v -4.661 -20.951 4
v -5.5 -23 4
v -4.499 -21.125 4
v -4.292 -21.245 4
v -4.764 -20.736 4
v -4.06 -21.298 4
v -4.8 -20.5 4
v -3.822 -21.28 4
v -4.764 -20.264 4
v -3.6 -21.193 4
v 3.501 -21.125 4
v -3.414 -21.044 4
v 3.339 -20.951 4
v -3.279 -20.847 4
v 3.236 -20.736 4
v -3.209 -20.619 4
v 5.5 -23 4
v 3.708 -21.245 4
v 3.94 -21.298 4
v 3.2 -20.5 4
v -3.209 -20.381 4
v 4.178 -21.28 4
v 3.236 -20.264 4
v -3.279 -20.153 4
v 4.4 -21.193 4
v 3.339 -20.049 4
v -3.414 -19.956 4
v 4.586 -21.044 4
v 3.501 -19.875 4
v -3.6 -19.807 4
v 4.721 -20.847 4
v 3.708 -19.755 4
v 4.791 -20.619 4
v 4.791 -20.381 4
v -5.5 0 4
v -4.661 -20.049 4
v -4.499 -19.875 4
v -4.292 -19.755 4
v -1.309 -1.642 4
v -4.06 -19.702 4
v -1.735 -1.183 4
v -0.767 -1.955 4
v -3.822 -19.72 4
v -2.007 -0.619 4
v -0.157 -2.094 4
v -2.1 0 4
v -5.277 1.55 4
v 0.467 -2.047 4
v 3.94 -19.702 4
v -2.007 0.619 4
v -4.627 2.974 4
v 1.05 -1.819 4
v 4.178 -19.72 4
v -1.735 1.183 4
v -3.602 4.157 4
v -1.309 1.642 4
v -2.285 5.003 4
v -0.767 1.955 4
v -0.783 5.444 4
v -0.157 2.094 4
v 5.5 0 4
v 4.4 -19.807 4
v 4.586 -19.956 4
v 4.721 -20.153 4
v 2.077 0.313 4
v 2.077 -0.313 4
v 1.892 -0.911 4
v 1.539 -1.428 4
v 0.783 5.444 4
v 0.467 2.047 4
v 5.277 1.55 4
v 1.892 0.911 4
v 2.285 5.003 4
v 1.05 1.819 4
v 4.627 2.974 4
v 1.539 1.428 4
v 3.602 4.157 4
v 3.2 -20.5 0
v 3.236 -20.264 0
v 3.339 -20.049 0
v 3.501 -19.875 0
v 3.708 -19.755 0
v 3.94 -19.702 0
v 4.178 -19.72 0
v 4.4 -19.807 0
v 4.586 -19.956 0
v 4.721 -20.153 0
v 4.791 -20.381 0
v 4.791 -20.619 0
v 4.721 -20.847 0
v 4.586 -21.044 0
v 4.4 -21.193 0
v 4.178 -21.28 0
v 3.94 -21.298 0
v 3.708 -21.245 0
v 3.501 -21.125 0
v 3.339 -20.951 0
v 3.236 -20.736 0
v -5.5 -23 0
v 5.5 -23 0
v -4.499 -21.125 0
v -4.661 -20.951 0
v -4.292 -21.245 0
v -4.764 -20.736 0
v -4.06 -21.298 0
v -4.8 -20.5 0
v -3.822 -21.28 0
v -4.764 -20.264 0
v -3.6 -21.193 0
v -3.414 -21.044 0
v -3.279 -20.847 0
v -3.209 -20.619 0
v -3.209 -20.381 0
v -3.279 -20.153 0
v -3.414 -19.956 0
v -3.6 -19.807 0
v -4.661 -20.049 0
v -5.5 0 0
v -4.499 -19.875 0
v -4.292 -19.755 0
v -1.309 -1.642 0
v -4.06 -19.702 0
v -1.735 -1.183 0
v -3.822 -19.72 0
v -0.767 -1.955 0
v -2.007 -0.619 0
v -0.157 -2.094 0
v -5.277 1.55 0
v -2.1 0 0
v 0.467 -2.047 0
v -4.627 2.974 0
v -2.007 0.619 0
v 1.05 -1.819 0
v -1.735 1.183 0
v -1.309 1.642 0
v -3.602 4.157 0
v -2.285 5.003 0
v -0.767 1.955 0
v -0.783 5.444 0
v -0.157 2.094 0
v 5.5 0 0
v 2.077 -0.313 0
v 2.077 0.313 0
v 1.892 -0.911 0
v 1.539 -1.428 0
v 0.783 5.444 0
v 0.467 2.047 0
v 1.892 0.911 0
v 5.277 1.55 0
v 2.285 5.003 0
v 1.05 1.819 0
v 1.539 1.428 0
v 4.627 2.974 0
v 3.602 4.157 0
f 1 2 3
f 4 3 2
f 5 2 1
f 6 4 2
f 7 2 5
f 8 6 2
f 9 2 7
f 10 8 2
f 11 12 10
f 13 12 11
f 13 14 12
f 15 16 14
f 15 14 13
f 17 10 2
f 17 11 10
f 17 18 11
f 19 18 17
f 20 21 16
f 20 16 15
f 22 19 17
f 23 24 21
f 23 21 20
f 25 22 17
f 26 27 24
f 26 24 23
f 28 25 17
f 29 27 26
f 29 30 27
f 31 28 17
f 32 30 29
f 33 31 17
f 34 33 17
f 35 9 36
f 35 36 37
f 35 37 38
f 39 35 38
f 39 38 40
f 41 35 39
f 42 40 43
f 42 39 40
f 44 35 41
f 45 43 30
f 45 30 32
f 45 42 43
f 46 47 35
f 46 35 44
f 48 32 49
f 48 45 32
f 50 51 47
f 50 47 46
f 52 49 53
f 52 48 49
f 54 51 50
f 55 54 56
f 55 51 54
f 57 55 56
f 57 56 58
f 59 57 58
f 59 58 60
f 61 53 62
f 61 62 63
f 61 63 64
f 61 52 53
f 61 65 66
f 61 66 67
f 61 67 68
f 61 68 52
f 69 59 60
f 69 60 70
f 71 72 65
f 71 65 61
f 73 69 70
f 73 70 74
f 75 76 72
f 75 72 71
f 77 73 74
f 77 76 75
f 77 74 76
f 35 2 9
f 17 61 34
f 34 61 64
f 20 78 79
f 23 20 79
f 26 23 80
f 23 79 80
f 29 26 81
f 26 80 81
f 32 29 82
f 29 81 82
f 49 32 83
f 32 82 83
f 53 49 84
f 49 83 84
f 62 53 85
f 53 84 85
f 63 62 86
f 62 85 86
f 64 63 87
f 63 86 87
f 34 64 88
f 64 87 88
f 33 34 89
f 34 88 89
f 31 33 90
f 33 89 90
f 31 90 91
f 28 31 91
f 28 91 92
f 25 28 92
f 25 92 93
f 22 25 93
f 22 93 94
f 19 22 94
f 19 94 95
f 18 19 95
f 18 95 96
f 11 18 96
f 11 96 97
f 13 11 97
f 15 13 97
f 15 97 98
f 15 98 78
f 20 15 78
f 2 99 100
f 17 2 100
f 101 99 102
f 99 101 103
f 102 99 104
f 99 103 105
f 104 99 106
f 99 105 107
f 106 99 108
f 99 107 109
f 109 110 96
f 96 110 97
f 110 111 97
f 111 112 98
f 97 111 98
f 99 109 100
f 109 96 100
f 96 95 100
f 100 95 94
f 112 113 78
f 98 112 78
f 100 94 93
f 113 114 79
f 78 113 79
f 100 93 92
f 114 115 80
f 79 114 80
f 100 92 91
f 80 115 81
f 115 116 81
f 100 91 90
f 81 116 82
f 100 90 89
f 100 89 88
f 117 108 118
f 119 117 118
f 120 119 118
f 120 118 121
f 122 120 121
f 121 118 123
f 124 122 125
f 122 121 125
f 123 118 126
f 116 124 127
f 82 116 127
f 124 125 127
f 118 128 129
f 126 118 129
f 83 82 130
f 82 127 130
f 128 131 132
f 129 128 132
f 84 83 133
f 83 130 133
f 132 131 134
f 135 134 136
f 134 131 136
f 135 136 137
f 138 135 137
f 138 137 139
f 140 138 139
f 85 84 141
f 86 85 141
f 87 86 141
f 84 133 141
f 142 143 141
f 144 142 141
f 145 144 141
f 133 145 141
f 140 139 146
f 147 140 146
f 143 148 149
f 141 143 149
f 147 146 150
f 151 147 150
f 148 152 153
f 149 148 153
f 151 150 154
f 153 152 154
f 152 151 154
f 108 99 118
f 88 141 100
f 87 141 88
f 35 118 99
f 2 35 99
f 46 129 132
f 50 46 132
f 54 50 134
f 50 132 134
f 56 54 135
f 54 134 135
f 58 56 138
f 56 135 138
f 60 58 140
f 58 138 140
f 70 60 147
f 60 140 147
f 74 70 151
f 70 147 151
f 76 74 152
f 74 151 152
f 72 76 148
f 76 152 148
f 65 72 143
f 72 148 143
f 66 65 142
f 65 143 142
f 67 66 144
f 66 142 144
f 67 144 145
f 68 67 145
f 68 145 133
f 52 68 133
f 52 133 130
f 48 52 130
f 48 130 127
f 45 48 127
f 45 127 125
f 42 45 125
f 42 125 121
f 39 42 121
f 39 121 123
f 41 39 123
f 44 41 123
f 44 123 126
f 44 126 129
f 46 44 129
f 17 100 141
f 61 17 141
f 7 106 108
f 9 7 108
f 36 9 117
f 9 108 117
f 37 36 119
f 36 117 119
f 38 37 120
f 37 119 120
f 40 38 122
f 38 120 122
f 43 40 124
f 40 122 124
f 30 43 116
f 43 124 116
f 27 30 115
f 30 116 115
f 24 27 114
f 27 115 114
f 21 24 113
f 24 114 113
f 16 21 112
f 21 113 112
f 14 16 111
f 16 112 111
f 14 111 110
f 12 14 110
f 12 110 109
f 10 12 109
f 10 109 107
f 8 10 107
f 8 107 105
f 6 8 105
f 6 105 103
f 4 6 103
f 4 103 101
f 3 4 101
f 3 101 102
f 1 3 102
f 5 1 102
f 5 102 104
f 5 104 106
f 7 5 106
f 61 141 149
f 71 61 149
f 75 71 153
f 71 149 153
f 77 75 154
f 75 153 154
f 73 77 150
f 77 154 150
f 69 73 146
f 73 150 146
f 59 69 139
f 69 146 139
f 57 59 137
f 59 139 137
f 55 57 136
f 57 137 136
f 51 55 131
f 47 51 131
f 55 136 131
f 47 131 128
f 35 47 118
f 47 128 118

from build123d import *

# Parameters (mm, degrees)
RESSALTO_EXTRUS_O1_DEPTH                = 4
FURO_ROSCADO_DE_M21_D                   = 1.6
FURO_ROSCADO_PARA_CONDU_TE_DE_M4X0_71_D = 4.2


with BuildPart() as part:
    # Esboço1 → Ressalto-extrusão1 (new body)
    with BuildSketch(Plane.XY):
        with BuildLine():
            Line((-5.5, 0), (-5.5, -23))
            Line((-5.5, -23), (5.5, -23))
            Line((5.5, -23), (5.5, 0))
            ThreePointArc((5.5, 0), (0, 5.5), (-5.5, 0))
        make_face()
    extrude(amount=RESSALTO_EXTRUS_O1_DEPTH)

    # Furo roscado de M21 (through all)
    with Locations(Plane(origin=(-4, -20.5, 4), x_dir=(1, 0, 0), z_dir=(0, 0, 1))):
        with Locations((0, 0), (8, 0)):
            Hole(FURO_ROSCADO_DE_M21_D / 2)

    # Furo roscado para conduíte de M4x0.71 (through all)
    with Locations(Plane.XY.offset(4)):
        with Locations((0, 0)):
            Hole(FURO_ROSCADO_PARA_CONDU_TE_DE_M4X0_71_D / 2)


solid = part.part
